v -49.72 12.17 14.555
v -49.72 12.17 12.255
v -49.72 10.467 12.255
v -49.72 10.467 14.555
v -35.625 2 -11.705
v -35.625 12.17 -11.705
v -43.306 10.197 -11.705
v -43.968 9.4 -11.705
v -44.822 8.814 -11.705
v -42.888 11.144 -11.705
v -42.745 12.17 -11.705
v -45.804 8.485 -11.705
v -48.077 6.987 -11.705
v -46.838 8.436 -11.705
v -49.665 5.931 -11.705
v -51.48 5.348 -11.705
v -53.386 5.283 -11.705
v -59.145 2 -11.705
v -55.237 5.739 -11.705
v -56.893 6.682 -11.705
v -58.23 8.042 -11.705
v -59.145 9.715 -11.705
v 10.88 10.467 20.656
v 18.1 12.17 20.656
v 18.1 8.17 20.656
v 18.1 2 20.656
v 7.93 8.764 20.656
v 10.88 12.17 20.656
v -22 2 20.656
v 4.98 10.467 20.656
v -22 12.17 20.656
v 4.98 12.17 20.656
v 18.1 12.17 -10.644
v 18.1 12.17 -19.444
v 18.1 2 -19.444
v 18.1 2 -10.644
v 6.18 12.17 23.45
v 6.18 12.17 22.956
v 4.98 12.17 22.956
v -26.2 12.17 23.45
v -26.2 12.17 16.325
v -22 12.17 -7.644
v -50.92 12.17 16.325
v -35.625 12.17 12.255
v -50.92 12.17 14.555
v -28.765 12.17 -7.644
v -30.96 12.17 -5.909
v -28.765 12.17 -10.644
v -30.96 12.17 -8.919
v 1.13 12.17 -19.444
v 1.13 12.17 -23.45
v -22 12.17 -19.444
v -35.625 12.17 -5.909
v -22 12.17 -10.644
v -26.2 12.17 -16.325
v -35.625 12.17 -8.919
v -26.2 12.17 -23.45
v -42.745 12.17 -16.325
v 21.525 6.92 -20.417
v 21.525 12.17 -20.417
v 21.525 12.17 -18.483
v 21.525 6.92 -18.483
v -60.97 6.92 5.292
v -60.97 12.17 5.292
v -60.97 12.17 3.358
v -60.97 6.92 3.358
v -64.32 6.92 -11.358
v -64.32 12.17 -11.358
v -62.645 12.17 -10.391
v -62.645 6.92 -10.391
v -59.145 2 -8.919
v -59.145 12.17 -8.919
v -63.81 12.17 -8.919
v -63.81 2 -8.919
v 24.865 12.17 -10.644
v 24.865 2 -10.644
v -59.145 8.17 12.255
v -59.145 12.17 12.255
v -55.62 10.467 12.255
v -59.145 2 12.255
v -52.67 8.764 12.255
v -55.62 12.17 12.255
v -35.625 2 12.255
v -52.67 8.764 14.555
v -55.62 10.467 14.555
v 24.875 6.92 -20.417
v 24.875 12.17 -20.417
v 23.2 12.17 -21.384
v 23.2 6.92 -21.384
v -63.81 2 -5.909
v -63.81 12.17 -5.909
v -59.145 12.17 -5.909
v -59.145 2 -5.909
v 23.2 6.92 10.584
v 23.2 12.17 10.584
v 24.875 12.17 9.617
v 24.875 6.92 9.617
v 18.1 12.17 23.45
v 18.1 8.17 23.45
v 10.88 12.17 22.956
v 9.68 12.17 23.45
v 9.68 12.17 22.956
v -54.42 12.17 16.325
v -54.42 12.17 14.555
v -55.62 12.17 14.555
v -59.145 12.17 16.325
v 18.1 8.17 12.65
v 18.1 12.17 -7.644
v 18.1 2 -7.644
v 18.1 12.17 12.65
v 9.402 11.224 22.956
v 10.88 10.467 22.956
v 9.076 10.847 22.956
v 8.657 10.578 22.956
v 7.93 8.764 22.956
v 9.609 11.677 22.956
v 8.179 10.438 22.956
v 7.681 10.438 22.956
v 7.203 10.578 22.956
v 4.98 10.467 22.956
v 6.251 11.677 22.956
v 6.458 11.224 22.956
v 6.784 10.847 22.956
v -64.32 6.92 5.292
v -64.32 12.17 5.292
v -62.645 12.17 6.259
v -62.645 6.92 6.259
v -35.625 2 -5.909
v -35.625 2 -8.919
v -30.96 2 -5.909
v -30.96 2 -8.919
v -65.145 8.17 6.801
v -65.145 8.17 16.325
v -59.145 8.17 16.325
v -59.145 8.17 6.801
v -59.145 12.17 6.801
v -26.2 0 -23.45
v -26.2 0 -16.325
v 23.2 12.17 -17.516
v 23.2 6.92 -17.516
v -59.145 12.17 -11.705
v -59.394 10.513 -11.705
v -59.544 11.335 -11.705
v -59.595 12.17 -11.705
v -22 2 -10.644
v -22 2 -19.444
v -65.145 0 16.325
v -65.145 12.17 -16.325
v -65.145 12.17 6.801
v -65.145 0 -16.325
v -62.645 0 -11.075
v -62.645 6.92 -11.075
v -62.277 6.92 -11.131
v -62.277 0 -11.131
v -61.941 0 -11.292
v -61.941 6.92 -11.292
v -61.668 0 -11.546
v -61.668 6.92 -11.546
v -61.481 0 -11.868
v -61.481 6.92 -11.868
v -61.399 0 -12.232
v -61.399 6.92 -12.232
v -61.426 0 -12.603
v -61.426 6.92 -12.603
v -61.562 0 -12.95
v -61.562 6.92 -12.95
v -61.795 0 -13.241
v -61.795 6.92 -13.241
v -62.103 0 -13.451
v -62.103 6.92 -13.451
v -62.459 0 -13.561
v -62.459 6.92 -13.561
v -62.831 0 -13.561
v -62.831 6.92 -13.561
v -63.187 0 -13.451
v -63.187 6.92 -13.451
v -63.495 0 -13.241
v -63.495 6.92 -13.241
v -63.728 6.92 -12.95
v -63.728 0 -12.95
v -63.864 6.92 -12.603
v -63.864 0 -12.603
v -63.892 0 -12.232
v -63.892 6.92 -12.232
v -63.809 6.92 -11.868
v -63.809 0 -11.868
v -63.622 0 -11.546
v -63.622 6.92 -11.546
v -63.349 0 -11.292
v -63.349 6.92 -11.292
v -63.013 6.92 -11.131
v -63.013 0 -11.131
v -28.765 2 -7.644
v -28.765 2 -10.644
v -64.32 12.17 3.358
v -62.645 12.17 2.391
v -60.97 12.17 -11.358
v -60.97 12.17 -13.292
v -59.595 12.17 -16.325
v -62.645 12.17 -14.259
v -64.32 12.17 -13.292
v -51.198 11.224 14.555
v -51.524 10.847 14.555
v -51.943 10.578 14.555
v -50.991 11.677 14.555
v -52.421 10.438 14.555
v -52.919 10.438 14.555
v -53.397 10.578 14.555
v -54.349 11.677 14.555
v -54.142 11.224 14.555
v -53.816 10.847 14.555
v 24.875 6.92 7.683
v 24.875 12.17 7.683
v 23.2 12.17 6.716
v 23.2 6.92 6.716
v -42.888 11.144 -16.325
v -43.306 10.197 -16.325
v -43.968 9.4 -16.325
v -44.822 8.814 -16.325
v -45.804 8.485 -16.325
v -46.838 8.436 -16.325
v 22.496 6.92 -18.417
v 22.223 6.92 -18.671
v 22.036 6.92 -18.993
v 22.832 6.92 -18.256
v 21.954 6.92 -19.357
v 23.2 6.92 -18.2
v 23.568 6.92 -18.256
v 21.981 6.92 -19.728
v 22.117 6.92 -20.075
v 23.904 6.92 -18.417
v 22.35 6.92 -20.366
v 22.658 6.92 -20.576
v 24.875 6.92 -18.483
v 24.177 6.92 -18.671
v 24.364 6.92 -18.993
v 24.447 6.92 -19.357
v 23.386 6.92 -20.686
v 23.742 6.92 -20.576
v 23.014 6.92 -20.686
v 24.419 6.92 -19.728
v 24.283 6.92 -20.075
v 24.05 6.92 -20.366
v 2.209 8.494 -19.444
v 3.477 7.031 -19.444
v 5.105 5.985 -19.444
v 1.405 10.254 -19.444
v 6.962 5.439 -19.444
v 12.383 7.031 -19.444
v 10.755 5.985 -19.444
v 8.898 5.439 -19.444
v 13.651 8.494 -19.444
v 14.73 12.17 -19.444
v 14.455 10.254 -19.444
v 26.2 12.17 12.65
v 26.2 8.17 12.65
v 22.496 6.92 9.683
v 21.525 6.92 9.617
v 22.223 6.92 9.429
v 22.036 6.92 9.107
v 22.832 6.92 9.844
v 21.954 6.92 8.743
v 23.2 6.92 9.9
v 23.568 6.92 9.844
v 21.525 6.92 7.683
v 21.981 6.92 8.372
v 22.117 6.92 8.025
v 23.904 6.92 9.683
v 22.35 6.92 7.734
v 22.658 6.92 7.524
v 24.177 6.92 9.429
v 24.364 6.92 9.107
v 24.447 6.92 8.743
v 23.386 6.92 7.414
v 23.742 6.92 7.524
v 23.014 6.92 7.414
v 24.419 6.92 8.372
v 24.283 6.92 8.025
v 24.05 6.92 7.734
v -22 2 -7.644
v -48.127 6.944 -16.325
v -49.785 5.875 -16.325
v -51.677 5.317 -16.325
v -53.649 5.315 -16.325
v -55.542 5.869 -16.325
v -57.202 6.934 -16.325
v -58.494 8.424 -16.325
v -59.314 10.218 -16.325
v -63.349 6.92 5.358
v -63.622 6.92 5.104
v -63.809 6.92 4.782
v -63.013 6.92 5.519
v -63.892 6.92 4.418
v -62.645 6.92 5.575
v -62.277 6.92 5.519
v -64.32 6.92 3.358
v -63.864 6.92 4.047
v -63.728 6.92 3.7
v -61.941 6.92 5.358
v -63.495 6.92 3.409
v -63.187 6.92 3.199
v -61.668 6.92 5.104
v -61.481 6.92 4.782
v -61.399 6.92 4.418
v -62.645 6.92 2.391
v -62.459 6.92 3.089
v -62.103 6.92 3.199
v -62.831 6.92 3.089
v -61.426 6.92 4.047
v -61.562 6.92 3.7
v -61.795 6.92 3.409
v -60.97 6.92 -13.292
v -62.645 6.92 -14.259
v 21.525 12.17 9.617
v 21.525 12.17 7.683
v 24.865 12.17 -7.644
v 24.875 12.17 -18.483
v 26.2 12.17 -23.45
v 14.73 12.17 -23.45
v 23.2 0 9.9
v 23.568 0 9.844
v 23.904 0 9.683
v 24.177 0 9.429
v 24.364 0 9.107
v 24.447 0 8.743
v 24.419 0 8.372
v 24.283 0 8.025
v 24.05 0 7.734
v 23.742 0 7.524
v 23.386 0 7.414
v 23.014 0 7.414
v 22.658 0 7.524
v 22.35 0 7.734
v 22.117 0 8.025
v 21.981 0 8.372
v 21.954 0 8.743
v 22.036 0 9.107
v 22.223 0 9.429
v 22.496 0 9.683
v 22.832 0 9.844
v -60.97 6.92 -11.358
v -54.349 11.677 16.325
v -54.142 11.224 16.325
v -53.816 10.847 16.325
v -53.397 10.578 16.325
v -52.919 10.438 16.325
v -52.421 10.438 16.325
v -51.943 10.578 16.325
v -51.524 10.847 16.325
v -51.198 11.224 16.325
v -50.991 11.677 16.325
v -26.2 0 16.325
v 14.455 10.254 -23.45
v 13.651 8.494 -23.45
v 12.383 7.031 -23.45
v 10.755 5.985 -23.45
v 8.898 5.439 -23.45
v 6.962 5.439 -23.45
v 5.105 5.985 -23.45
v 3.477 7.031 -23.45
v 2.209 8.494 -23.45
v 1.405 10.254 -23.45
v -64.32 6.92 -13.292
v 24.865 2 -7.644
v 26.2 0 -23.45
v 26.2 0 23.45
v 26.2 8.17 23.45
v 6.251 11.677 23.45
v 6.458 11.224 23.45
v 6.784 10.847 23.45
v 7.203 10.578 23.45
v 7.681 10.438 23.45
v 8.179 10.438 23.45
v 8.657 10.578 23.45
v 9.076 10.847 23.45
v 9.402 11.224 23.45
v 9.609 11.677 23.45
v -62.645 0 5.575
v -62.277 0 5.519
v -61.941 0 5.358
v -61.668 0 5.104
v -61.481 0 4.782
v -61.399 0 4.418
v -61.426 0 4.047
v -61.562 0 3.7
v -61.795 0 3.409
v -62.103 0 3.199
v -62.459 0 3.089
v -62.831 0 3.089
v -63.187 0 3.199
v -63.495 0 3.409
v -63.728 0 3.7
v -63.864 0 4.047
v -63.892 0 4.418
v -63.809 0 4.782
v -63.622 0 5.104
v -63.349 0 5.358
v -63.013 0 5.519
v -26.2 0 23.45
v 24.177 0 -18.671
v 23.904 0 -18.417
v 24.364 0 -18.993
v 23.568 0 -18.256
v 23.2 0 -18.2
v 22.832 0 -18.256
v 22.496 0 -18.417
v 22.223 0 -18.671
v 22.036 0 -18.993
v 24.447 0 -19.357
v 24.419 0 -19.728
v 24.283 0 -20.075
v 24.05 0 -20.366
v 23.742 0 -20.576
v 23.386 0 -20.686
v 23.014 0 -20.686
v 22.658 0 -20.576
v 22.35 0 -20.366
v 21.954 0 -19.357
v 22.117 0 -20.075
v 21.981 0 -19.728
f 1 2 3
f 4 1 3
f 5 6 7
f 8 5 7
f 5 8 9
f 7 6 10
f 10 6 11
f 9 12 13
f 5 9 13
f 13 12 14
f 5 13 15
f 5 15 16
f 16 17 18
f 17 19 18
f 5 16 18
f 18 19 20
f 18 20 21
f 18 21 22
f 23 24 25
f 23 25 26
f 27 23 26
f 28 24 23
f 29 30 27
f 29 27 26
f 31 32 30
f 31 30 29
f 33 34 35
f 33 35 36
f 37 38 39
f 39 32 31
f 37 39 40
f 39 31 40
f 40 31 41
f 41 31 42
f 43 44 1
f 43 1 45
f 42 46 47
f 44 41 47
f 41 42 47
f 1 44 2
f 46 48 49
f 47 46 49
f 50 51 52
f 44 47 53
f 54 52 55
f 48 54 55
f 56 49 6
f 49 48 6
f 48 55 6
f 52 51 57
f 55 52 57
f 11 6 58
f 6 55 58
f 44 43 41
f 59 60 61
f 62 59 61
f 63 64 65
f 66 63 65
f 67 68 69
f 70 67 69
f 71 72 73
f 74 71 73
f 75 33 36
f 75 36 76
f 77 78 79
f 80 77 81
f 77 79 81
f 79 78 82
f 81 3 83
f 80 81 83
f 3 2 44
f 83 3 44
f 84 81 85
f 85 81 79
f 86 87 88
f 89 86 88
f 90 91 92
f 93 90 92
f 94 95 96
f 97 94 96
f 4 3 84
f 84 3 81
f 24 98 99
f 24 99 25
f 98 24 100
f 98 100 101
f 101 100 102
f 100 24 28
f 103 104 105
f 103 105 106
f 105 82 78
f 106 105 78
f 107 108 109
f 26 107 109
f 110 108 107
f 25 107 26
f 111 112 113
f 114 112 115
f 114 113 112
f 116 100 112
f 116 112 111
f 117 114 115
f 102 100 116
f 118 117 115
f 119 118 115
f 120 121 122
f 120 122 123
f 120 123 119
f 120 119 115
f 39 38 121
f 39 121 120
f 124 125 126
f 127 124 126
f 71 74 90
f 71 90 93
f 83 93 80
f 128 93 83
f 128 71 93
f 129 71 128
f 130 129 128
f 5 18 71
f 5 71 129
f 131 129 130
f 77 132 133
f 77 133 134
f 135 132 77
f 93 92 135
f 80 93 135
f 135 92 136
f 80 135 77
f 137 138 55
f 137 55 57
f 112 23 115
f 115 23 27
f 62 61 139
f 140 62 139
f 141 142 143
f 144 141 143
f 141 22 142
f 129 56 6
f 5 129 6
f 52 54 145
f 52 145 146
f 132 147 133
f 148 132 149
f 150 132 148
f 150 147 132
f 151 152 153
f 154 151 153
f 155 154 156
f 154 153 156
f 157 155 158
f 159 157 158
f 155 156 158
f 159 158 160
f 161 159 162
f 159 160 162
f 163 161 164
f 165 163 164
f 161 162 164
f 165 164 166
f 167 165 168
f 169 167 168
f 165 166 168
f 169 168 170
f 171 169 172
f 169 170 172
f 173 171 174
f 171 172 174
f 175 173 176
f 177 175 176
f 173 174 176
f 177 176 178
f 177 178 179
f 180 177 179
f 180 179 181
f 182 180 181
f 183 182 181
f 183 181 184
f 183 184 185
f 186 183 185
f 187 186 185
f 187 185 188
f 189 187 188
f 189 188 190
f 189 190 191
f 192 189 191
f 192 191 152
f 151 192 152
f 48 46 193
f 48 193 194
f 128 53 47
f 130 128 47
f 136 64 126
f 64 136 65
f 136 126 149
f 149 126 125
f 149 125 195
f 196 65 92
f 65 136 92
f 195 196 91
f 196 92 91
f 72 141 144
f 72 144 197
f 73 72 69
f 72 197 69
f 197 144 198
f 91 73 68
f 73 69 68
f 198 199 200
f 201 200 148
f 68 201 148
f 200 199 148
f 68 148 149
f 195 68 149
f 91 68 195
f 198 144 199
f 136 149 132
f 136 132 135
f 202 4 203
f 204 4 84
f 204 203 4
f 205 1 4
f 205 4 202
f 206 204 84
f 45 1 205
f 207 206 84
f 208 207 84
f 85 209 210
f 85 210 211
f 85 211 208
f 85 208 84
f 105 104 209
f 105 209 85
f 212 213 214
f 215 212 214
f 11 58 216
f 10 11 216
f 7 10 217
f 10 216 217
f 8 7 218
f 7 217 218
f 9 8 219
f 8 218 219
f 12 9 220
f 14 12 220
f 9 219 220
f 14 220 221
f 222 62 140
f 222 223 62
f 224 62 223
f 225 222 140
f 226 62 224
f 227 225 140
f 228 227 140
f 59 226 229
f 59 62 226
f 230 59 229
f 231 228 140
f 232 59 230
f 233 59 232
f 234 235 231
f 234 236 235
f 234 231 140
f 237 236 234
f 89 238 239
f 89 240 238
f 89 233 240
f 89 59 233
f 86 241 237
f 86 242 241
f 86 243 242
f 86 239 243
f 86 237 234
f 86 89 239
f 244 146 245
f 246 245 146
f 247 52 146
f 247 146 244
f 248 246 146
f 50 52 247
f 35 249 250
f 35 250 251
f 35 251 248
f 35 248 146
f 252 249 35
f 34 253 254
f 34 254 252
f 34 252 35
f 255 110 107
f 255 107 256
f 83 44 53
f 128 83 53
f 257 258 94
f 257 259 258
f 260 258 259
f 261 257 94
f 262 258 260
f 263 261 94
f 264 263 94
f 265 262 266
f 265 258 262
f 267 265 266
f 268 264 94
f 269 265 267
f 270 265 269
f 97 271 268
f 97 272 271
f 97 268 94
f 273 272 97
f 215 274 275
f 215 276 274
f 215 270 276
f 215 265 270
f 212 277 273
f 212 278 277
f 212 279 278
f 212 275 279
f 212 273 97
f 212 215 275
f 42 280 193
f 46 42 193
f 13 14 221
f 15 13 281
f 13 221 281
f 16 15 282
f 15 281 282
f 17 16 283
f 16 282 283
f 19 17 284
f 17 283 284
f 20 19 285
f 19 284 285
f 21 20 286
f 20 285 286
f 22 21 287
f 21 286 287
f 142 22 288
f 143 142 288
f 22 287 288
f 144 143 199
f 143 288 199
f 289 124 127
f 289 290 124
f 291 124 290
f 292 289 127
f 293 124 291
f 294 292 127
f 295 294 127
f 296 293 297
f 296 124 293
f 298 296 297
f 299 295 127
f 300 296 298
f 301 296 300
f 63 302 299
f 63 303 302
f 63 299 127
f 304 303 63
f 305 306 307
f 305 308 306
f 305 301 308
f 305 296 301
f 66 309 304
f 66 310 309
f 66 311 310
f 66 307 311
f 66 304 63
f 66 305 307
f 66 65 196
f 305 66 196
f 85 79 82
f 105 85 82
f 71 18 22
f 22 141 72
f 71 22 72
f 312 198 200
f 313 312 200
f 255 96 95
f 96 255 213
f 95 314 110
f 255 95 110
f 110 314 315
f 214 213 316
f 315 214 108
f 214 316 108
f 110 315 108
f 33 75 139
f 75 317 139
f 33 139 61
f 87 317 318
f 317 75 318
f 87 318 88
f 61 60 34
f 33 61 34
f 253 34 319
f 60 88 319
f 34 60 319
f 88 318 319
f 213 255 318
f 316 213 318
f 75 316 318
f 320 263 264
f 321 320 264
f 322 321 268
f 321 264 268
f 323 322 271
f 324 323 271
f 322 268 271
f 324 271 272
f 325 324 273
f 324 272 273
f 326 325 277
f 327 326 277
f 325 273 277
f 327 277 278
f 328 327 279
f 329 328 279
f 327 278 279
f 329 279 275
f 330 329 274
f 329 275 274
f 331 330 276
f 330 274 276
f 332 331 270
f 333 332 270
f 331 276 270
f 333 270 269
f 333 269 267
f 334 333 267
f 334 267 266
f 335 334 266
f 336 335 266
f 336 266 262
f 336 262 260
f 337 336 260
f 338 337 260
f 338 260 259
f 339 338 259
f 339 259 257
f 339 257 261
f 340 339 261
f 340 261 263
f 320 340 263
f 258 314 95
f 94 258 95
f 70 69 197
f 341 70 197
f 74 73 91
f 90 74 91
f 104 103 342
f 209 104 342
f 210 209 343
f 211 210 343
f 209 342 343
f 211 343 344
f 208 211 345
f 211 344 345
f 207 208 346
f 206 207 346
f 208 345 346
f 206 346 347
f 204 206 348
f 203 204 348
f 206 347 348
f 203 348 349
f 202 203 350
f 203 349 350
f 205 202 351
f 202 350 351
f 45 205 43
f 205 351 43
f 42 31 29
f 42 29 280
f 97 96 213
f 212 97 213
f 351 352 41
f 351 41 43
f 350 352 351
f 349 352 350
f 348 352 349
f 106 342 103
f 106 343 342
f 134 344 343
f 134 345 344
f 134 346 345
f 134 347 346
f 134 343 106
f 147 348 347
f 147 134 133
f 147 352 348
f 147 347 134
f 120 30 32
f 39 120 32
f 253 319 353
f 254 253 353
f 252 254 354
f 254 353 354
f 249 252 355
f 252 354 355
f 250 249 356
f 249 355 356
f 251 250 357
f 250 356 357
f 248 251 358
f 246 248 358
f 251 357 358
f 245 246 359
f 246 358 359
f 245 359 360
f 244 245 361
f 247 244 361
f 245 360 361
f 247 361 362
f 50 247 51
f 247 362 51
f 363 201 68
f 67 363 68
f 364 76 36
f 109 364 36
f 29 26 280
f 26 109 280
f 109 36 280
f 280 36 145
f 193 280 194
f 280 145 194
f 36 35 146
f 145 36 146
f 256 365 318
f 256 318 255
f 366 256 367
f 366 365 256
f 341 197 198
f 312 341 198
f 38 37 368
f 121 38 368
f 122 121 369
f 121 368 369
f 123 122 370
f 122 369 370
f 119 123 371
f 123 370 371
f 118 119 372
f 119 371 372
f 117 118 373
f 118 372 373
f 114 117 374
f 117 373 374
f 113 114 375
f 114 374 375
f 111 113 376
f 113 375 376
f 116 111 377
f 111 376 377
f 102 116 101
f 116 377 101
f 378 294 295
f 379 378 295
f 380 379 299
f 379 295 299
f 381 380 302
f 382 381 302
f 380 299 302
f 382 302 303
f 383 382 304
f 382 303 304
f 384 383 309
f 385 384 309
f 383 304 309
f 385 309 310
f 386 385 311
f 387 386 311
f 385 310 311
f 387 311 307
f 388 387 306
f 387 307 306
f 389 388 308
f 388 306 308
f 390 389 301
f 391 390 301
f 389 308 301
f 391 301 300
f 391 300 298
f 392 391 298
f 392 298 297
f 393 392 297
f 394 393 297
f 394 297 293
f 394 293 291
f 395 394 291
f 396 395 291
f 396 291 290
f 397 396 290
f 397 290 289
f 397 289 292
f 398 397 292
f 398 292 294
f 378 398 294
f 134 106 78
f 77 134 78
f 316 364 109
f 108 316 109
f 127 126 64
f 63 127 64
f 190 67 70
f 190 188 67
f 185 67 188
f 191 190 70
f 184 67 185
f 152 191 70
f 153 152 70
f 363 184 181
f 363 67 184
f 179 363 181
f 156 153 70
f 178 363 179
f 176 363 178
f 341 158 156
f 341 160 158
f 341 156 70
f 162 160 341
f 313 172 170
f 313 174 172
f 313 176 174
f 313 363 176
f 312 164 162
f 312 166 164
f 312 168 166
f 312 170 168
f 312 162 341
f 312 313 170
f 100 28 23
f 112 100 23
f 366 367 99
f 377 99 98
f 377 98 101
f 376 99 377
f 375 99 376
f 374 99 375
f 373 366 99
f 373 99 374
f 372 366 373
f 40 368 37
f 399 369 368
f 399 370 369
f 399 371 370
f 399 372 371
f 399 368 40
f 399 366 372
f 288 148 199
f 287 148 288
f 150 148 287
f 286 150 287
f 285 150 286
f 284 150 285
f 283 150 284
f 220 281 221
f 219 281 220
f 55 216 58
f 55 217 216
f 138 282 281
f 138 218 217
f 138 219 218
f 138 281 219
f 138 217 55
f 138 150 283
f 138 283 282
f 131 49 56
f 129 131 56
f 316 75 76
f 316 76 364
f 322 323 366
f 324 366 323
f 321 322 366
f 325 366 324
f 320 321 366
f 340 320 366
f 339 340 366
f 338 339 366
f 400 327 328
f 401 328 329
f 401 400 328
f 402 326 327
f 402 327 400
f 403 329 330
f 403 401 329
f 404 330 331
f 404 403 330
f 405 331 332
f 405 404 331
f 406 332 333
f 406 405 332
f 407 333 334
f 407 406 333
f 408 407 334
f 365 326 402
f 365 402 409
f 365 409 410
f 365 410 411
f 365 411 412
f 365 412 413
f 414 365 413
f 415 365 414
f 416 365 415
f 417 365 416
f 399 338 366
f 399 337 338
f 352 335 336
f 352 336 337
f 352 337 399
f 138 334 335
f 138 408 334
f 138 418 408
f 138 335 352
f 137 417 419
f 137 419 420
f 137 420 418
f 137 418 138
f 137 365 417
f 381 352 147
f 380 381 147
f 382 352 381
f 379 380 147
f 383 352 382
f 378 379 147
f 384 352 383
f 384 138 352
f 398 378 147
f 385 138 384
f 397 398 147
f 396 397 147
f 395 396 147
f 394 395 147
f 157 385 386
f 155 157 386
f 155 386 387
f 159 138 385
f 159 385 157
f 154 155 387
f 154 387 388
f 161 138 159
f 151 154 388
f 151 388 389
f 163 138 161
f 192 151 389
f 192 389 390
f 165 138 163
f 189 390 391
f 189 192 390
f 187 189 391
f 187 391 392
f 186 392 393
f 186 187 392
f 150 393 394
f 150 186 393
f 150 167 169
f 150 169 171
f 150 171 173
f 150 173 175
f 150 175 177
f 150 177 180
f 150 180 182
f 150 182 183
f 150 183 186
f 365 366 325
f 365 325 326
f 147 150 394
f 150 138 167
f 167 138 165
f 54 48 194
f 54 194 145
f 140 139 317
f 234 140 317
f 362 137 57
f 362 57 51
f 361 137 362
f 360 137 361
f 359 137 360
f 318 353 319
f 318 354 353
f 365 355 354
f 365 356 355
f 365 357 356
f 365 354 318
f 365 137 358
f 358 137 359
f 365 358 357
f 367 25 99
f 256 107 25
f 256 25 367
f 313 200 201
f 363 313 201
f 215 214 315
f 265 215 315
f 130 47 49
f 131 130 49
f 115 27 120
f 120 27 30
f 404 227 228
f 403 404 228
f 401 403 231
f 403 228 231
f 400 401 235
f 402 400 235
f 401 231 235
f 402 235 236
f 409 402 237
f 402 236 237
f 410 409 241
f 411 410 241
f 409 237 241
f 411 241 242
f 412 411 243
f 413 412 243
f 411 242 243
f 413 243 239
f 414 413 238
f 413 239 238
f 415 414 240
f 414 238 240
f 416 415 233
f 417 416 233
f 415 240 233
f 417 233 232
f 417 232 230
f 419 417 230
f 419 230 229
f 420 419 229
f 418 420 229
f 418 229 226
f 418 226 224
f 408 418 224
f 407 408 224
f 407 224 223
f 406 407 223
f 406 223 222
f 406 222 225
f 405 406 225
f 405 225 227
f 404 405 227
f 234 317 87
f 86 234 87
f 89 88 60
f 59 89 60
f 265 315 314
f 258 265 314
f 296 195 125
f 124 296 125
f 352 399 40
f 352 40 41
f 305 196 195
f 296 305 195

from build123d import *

# Parameters (mm, degrees)
BOSS_EXTRUDE1_DEPTH = 12.1700036
SKETCH2_W           = 8.1000092
SKETCH2_H           = 10.8000038
SKETCH2_W_2         = 6.0000134
SKETCH2_H_2         = 9.5240094
CUT_EXTRUDE1_DEPTH  = 3.999992
CUT_EXTRUDE2_DEPTH  = 10.1700076
CUT_EXTRUDE3_DEPTH  = 4.0060118
CUT_EXTRUDE4_DEPTH  = 4.6199806
CUT_EXTRUDE5_DEPTH  = 5.2500022
CUT_EXTRUDE6_REACH  = 83.189
SKETCH7_R           = 1.7499965
CUT_EXTRUDE7_DEPTH  = 2.2999954
CUT_EXTRUDE8_DEPTH  = 2.2999954
SKETCH10_R          = 1.2499975
CUT_EXTRUDE9_DEPTH  = 71.298530747


with BuildPart() as part:
    # Sketch1 → Boss-Extrude1 (new body)
    with BuildSketch(Plane(origin=(0, 0, 0), x_dir=(1, 0, 0), z_dir=(0, 1, 0))):
        Polygon((-26.1999984, 16.3249991), (-26.1999984, 23.4500039), (26.1999984, 23.4500039), (26.1999984, -23.4500039), (-26.1999984, -23.4500039), (-26.1999984, -16.3249991), (-65.1450056, -16.3249991), (-65.1450056, 16.3249991), align=None)
    extrude(amount=BOSS_EXTRUDE1_DEPTH)

    # Sketch2 → Cut-Extrude1 (cut)
    with BuildSketch(Plane(origin=(0, 12.1700036, 0), x_dir=(1, 0, 0), z_dir=(0, 1, 0))):
        with Locations((22.1499938, -18.050002)):
            Rectangle(SKETCH2_W, SKETCH2_H)
        with Locations((-62.1449989, -11.5629944)):
            Rectangle(SKETCH2_W_2, SKETCH2_H_2)
    extrude(amount=-CUT_EXTRUDE1_DEPTH, mode=Mode.SUBTRACT)

    # Sketch3 → Cut-Extrude2 (cut)
    with BuildSketch(Plane(origin=(0, 12.1700036, 0), x_dir=(1, 0, 0), z_dir=(0, 1, 0))):
        Polygon((-59.1449922, -12.2549793), (-35.6249986, -12.2549793), (-35.6249986, 5.9090179), (-30.9599838, 5.9090179), (-30.9599838, 8.9190195), (-35.6249986, 8.9190195), (-35.6249986, 11.7050185), (-59.1449922, 11.7050185), (-59.1449922, 8.9190195), (-63.810007, 8.9190195), (-63.810007, 5.9090179), (-59.1449922, 5.9090179), align=None)
        Polygon((18.0999892, -20.6560039), (-22.0000068, -20.6560039), (-22.0000068, 7.6439903), (-28.7650174, 7.6439903), (-28.7650174, 10.6439843), (-22.0000068, 10.6439843), (-22.0000068, 19.4439921), (18.0999892, 19.4439921), (18.0999892, 10.6439843), (24.8649998, 10.6439843), (24.8649998, 7.6439903), (18.0999892, 7.6439903), align=None)
    extrude(amount=-CUT_EXTRUDE2_DEPTH, mode=Mode.SUBTRACT)

    # Sketch4 → Cut-Extrude3 (cut)
    with BuildSketch(Plane(origin=(0, 0, -23.4500039), x_dir=(-1, 0, 0), z_dir=(0, 0, -1))):
        with BuildLine():
            Line((-1.1299952, 12.1700036), (-14.7299934, 12.1700036))
            ThreePointArc((-14.7299934, 12.1700036), (-7.9299943, 5.3700045), (-1.1299952, 12.1700036))
        make_face()
    extrude(amount=-CUT_EXTRUDE3_DEPTH, mode=Mode.SUBTRACT)

    # Sketch5 → Cut-Extrude4 (cut)
    with BuildSketch(Plane(origin=(0, 0, -16.3249991), x_dir=(-1, 0, 0), z_dir=(0, 0, -1))):
        with BuildLine():
            ThreePointArc((46.838108, 8.4362036), (54.615256842, 5.524304205), (59.595004, 12.1700036))
            Line((59.595004, 12.1700036), (46.838108, 12.1700036))
            Line((46.838108, 12.1700036), (42.7449996, 12.1700036))
            ThreePointArc((42.7449996, 12.1700036), (43.96774198, 9.400015303), (46.838108, 8.4362036))
        make_face()
    extrude(amount=-CUT_EXTRUDE4_DEPTH, mode=Mode.SUBTRACT)

    # Sketch6 → Cut-Extrude5 (cut)
    with BuildSketch(Plane(origin=(0, 12.1700036, 0), x_dir=(1, 0, 0), z_dir=(0, 1, 0))):
        Polygon((-62.6450106, 14.2591155), (-64.320008607, 13.29205495), (-64.320008607, 11.35793385), (-62.6450106, 10.3908733), (-60.970012593, 11.35793385), (-60.970012593, 13.29205495), align=None)
        Polygon((-62.6450106, -2.3908893), (-64.320008607, -3.35794985), (-64.320008607, -5.29207095), (-62.6450106, -6.2591315), (-60.970012593, -5.29207095), (-60.970012593, -3.35794985), align=None)
        Polygon((23.2000044, 21.3841203), (21.525006393, 20.41705975), (21.525006393, 18.48293865), (23.2000044, 17.5158781), (24.875002407, 18.48293865), (24.875002407, 20.41705975), align=None)
        Polygon((23.2000044, -6.7158743), (21.525006393, -7.68293485), (21.525006393, -9.61705595), (23.2000044, -10.5841165), (24.875002407, -9.61705595), (24.875002407, -7.68293485), align=None)
    extrude(amount=-CUT_EXTRUDE5_DEPTH, mode=Mode.SUBTRACT)

    # Cut-Extrude6: up to this face of the body (flat: up to its plane)
    cut_extrude6_end = Plane(part.part.faces().sort_by_distance((-47.3849954, 7.0849998, 12.2549793))[0])
    # Sketch7 → Cut-Extrude6 (cut, up to the picked face)
    with BuildSketch(Plane.XY.offset(23.4500039), mode=Mode.PRIVATE) as cut_extrude6_sk1:
        with Locations((-52.6700115, 12.1700036)):
            Circle(SKETCH7_R)
    cut_extrude6_tool1 = split(extrude(cut_extrude6_sk1.sketch, amount=-CUT_EXTRUDE6_REACH, mode=Mode.PRIVATE), bisect_by=cut_extrude6_end, keep=Keep.BOTH, mode=Mode.PRIVATE)
    # Sketch7 → Cut-Extrude6 (cut, up to the picked face)
    with BuildSketch(Plane.XY.offset(23.4500039), mode=Mode.PRIVATE) as cut_extrude6_sk2:
        with Locations((7.9299943, 12.1700036)):
            Circle(SKETCH7_R)
    cut_extrude6_tool2 = split(extrude(cut_extrude6_sk2.sketch, amount=-CUT_EXTRUDE6_REACH, mode=Mode.PRIVATE), bisect_by=cut_extrude6_end, keep=Keep.BOTH, mode=Mode.PRIVATE)
    add(cut_extrude6_tool1.solids().sort_by(Axis((-52.670012, 12.170004, 23.450004), (0, 0, -1)))[0], mode=Mode.SUBTRACT)
    add(cut_extrude6_tool2.solids().sort_by(Axis((7.929994, 12.170004, 23.450004), (0, 0, -1)))[0], mode=Mode.SUBTRACT)

    # Sketch8 → Cut-Extrude7 (cut)
    with BuildSketch(Plane(origin=(0, 0, 20.6560039), x_dir=(-1, 0, 0), z_dir=(0, 0, -1))):
        Polygon((-10.8799884, 12.1700036), (-10.8799884, 10.466832), (-7.9299943, 8.763634463), (-4.9800002, 10.466832), (-4.9800002, 12.1700036), align=None)
    extrude(amount=-CUT_EXTRUDE7_DEPTH, mode=Mode.SUBTRACT)

    # Sketch9 → Cut-Extrude8 (cut)
    with BuildSketch(Plane(origin=(0, 0, 12.2549793), x_dir=(-1, 0, 0), z_dir=(0, 0, -1))):
        Polygon((49.7200174, 12.1700036), (49.7200174, 10.466832), (52.6700115, 8.763634463), (55.6200056, 10.466832), (55.6200056, 12.1700036), align=None)
    extrude(amount=-CUT_EXTRUDE8_DEPTH, mode=Mode.SUBTRACT)

    # Sketch10 → Cut-Extrude9 (cut, through all)
    with BuildSketch(Plane(origin=(0, 12.1700036, 0), x_dir=(1, 0, 0), z_dir=(0, 1, 0))):
        with Locations(Location((-62.6450106, 12.3249944, 0), (0, 0, 270))):
            Circle(SKETCH10_R)
        with Locations(Location((-62.6450106, -4.3250104, 0), (0, 0, 270))):
            Circle(SKETCH10_R)
        with Locations(Location((23.2000044, -8.6499954, 0), (0, 0, 270))):
            Circle(SKETCH10_R)
        with Locations(Location((23.2000044, 19.4499992, 0), (0, 0, 270))):
            Circle(SKETCH10_R)
    extrude(amount=-CUT_EXTRUDE9_DEPTH, mode=Mode.SUBTRACT)


solid = part.part
